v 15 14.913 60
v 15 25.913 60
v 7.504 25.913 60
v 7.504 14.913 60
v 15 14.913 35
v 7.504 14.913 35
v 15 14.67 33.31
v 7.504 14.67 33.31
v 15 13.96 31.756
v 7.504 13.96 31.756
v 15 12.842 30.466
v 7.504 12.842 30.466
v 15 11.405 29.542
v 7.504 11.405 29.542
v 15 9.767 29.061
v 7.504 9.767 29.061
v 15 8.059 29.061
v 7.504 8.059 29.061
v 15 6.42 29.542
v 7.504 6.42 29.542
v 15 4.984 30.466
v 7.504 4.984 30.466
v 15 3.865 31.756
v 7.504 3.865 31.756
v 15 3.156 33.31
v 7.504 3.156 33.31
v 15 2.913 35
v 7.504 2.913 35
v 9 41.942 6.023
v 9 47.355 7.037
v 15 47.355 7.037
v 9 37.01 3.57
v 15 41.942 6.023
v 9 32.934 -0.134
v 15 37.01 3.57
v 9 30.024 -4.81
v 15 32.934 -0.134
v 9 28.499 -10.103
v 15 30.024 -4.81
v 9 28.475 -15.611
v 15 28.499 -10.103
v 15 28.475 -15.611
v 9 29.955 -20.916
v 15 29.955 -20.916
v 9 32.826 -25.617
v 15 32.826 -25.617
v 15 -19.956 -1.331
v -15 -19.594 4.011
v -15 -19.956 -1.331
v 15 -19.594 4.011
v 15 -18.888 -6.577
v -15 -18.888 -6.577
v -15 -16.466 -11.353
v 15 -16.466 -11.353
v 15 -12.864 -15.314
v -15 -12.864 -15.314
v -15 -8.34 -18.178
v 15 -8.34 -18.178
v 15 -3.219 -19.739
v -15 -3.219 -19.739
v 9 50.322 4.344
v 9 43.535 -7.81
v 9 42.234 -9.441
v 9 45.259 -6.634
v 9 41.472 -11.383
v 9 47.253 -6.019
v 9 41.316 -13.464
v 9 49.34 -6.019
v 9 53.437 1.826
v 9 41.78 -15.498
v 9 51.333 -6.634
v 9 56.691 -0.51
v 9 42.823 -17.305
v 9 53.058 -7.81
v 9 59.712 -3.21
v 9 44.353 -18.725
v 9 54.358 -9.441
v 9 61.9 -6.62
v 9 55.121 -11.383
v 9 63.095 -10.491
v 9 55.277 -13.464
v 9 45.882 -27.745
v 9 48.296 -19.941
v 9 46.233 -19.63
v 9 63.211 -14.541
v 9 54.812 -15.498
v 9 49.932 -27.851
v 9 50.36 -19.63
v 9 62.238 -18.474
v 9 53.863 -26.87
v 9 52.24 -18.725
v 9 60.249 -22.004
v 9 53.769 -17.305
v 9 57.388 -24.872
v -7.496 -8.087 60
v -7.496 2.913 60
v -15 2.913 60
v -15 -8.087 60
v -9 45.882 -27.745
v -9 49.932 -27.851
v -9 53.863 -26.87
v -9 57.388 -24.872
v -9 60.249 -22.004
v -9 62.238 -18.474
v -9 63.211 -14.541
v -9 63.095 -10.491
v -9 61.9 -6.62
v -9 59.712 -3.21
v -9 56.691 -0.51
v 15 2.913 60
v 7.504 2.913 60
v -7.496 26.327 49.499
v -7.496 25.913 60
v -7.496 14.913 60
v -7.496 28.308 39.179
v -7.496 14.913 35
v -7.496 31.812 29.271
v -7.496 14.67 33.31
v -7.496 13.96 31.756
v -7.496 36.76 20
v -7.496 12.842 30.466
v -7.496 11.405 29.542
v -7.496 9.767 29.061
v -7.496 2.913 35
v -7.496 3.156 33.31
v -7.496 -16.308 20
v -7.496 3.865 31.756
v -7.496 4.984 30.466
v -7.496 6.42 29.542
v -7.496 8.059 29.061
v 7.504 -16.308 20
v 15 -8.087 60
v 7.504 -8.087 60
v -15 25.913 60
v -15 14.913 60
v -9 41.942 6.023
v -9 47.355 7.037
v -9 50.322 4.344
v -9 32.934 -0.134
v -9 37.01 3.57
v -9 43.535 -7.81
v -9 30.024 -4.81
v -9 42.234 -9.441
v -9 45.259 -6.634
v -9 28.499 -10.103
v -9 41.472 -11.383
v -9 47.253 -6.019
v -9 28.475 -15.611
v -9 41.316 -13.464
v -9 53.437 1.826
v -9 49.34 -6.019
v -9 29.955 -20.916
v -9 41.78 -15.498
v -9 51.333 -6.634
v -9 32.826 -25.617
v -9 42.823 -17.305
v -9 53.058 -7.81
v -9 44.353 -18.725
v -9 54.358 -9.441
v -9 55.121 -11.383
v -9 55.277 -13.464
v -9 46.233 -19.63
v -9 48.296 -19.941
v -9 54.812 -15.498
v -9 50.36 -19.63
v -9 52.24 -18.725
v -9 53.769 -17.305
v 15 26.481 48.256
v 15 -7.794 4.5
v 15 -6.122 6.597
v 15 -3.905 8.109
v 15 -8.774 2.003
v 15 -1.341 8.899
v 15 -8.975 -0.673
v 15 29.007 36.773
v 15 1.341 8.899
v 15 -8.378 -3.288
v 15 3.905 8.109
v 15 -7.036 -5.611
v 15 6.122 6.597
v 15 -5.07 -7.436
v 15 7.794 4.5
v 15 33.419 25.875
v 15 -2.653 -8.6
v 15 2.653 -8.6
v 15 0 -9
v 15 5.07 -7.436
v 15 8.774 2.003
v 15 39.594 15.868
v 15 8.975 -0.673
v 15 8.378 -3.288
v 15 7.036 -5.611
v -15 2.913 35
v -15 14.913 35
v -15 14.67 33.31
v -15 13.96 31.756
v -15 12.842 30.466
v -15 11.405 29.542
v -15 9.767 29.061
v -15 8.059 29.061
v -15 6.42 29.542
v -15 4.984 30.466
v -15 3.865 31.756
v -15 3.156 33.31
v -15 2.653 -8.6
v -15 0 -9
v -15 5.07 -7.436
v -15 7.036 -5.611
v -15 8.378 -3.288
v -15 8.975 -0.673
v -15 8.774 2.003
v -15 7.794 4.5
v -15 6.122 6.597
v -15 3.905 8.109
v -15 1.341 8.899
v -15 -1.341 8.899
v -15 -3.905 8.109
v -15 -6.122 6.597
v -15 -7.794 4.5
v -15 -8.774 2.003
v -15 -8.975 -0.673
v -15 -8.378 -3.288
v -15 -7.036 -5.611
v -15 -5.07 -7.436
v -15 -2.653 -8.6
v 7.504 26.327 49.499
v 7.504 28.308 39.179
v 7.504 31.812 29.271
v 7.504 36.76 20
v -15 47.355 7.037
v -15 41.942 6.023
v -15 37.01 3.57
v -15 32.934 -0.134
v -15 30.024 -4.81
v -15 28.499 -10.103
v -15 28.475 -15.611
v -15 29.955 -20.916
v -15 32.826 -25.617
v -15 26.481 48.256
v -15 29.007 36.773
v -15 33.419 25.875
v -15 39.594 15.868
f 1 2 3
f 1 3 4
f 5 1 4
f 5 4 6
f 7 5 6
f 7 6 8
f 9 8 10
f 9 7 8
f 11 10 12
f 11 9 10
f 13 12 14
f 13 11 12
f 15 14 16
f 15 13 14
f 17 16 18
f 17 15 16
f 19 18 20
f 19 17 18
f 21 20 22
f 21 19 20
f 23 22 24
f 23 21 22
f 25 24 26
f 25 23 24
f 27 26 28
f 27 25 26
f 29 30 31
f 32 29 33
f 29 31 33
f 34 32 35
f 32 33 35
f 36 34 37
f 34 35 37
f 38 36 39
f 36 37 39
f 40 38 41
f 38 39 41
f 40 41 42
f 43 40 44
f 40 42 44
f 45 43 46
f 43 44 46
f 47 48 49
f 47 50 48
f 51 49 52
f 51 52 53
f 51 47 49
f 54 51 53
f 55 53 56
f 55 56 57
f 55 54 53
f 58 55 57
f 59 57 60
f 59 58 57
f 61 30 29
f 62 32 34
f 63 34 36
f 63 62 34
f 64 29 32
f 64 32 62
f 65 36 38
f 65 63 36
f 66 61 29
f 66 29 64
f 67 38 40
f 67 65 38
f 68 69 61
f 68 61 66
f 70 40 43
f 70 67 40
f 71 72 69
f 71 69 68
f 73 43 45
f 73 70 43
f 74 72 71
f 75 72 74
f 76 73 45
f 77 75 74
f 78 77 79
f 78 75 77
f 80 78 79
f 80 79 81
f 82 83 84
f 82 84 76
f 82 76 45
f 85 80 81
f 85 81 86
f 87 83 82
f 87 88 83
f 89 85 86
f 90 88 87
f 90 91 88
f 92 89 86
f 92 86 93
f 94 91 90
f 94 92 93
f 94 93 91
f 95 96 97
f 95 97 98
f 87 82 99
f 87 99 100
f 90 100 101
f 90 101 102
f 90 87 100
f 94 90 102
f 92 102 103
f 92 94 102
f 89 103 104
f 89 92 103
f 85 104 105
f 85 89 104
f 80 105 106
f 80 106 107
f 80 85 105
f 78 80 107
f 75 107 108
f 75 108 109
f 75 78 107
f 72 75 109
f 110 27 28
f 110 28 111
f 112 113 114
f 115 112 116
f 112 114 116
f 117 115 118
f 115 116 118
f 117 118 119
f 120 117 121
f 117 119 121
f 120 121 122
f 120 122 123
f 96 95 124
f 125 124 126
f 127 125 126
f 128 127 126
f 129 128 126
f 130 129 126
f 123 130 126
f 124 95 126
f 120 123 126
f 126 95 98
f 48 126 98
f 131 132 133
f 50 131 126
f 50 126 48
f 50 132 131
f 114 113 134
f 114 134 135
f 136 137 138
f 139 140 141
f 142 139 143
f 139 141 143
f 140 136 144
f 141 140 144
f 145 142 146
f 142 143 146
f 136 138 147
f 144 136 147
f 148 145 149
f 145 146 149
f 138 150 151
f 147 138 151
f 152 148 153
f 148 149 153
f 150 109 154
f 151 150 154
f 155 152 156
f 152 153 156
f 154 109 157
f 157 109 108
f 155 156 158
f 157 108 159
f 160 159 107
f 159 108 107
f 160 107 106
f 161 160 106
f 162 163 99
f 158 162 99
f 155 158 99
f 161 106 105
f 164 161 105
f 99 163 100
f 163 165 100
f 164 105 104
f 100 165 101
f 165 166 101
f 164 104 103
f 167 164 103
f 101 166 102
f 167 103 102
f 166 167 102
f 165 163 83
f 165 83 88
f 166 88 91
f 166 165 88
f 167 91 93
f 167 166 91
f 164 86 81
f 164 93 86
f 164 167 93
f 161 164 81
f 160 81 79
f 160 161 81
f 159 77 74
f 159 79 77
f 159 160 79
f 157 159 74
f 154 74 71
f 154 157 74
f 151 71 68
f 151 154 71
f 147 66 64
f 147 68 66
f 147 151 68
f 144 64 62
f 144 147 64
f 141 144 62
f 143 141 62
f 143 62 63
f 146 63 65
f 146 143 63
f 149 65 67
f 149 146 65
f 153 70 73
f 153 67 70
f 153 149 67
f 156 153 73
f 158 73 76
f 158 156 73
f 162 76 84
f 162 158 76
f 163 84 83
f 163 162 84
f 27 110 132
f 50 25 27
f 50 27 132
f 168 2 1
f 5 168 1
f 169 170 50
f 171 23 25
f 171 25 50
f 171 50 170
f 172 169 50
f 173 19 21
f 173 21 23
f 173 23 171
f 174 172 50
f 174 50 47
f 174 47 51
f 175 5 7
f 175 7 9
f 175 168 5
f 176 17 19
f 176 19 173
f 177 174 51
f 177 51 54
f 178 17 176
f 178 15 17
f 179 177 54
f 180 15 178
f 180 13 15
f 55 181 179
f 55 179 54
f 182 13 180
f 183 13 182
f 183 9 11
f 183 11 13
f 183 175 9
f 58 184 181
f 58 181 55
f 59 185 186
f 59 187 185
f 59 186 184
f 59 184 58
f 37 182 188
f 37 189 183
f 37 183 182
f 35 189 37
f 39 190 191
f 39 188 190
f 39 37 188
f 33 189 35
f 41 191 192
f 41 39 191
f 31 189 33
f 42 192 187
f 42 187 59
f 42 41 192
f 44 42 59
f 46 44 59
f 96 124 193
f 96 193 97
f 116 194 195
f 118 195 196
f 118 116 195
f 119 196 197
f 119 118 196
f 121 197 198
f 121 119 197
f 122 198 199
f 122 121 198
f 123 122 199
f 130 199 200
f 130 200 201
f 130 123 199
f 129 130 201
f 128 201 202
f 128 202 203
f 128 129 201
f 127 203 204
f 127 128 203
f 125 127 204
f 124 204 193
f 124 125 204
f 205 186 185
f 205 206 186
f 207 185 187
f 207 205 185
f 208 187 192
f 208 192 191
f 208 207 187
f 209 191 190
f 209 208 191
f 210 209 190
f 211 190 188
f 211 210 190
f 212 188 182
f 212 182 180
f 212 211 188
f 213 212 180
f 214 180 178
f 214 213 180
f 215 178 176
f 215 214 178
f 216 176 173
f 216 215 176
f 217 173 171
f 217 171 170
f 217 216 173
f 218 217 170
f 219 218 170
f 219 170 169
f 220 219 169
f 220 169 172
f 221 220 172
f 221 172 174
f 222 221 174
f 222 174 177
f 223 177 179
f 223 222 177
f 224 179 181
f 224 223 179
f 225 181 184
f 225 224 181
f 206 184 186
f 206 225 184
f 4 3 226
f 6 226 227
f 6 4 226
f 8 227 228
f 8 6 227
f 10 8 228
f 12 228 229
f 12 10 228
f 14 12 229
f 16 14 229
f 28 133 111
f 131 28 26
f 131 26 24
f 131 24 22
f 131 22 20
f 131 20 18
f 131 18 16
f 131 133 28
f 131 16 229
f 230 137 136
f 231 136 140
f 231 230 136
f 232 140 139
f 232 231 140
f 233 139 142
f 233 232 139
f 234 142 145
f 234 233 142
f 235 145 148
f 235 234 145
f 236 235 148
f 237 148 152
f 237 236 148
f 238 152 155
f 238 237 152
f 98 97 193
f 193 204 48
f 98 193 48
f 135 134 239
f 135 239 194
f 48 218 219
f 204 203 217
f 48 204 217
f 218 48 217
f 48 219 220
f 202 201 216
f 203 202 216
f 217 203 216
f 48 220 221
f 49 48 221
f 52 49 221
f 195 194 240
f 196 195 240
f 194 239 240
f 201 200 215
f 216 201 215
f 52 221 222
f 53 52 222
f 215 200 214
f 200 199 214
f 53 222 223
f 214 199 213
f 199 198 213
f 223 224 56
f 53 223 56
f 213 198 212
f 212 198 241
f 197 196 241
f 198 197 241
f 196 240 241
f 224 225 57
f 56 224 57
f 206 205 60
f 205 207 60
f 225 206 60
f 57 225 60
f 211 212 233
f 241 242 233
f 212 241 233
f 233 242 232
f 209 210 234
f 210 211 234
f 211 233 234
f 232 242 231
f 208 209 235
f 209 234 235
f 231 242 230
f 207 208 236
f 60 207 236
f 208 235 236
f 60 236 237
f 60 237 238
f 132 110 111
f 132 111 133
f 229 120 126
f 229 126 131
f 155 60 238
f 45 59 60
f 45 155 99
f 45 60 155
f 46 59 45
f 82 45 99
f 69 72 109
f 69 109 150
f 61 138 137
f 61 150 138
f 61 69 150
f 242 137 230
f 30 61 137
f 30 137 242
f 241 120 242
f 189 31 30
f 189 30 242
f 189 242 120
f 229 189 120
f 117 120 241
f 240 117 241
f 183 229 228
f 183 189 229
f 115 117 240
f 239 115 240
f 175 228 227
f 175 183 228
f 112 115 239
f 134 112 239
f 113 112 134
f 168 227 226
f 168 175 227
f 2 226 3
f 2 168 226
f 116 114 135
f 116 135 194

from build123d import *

# Parameters (mm, degrees)
IZIM2_R                     = 7
IZIM2_R_2                   = 9
Y_KSEKLIK_EKSTR_ZYON1_DEPTH = 15
IZIM3_R                     = 20
KES_EKSTR_ZYON1_DEPTH       = 6
KES_EKSTR_ZYON4_DEPTH       = 18
KES_EKSTR_ZYON4_DEPTH_BACK  = 77.999207989
IZIM5_W                     = 15
IZIM5_H                     = 40


with BuildPart() as part:
    # Çizim2 → Yükseklik-Ekstrüzyon1 (new, symmetric)
    with BuildSketch(Plane(origin=(0, 0, 0), x_dir=(0, 0, -1), z_dir=(1, 0, 0))):
        with BuildLine():
            Line((19.739319337, -3.218582315), (27.745441758, 45.882354578))
            ThreePointArc((27.745441758, 45.882354578), (18.474216993, 62.238421042), (0.510195975, 56.691307592))
            ThreePointArc((0.510195975, 56.691307592), (-25.763963339, 33.475550855), (-60, 25.912707322))
            Line((-60, 25.912707322), (-60, 14.912707322))
            Line((-60, 14.912707322), (-35, 14.912707322))
            ThreePointArc((-35, 14.912707322), (-29, 8.912707322), (-35, 2.912707322))
            Line((-35, 2.912707322), (-60, 2.912707322))
            Line((-60, 2.912707322), (-60, -8.087292678))
            Line((-60, -8.087292678), (-4.01109025, -19.593650885))
            ThreePointArc((-4.01109025, -19.593650885), (11.352533428, -16.465721508), (19.739319337, -3.218582315))
        make_face()
        with Locations((12.940952255, 48.296291314)):
            Circle(IZIM2_R, mode=Mode.SUBTRACT)
        Circle(IZIM2_R_2, mode=Mode.SUBTRACT)
    extrude(amount=Y_KSEKLIK_EKSTR_ZYON1_DEPTH, both=True)

    # Çizim3 → Kes-Ekstrüzyon1 (cut)
    with BuildSketch(Plane(origin=(15, 0, 0), x_dir=(0, 0, -1), z_dir=(1, 0, 0))):
        with Locations((12.940952255, 48.296291314)):
            Circle(IZIM3_R)
    kes_ekstr_zyon1 = extrude(amount=-KES_EKSTR_ZYON1_DEPTH, mode=Mode.SUBTRACT)

    # Aynalama1: Kes-Ekstrüzyon1 across plane
    add(kes_ekstr_zyon1.mirror(Plane(origin=(0, 0, 0), x_dir=(0, 0, 1), z_dir=(1, 0, 0))), mode=Mode.SUBTRACT)

    # Çizim5 → Kes-Ekstrüzyon4 (cut, two sides: drawn at the far end of the back side and taken through both)
    with BuildSketch(Plane(origin=(0, 25.86805022, 0), x_dir=(1, 0, 0), z_dir=(0, 1, 0)).offset(-KES_EKSTR_ZYON4_DEPTH_BACK)):
        with Locations((0.003643514, -40)):
            Rectangle(IZIM5_W, IZIM5_H)
    extrude(amount=KES_EKSTR_ZYON4_DEPTH + KES_EKSTR_ZYON4_DEPTH_BACK, mode=Mode.SUBTRACT)


solid = part.part
